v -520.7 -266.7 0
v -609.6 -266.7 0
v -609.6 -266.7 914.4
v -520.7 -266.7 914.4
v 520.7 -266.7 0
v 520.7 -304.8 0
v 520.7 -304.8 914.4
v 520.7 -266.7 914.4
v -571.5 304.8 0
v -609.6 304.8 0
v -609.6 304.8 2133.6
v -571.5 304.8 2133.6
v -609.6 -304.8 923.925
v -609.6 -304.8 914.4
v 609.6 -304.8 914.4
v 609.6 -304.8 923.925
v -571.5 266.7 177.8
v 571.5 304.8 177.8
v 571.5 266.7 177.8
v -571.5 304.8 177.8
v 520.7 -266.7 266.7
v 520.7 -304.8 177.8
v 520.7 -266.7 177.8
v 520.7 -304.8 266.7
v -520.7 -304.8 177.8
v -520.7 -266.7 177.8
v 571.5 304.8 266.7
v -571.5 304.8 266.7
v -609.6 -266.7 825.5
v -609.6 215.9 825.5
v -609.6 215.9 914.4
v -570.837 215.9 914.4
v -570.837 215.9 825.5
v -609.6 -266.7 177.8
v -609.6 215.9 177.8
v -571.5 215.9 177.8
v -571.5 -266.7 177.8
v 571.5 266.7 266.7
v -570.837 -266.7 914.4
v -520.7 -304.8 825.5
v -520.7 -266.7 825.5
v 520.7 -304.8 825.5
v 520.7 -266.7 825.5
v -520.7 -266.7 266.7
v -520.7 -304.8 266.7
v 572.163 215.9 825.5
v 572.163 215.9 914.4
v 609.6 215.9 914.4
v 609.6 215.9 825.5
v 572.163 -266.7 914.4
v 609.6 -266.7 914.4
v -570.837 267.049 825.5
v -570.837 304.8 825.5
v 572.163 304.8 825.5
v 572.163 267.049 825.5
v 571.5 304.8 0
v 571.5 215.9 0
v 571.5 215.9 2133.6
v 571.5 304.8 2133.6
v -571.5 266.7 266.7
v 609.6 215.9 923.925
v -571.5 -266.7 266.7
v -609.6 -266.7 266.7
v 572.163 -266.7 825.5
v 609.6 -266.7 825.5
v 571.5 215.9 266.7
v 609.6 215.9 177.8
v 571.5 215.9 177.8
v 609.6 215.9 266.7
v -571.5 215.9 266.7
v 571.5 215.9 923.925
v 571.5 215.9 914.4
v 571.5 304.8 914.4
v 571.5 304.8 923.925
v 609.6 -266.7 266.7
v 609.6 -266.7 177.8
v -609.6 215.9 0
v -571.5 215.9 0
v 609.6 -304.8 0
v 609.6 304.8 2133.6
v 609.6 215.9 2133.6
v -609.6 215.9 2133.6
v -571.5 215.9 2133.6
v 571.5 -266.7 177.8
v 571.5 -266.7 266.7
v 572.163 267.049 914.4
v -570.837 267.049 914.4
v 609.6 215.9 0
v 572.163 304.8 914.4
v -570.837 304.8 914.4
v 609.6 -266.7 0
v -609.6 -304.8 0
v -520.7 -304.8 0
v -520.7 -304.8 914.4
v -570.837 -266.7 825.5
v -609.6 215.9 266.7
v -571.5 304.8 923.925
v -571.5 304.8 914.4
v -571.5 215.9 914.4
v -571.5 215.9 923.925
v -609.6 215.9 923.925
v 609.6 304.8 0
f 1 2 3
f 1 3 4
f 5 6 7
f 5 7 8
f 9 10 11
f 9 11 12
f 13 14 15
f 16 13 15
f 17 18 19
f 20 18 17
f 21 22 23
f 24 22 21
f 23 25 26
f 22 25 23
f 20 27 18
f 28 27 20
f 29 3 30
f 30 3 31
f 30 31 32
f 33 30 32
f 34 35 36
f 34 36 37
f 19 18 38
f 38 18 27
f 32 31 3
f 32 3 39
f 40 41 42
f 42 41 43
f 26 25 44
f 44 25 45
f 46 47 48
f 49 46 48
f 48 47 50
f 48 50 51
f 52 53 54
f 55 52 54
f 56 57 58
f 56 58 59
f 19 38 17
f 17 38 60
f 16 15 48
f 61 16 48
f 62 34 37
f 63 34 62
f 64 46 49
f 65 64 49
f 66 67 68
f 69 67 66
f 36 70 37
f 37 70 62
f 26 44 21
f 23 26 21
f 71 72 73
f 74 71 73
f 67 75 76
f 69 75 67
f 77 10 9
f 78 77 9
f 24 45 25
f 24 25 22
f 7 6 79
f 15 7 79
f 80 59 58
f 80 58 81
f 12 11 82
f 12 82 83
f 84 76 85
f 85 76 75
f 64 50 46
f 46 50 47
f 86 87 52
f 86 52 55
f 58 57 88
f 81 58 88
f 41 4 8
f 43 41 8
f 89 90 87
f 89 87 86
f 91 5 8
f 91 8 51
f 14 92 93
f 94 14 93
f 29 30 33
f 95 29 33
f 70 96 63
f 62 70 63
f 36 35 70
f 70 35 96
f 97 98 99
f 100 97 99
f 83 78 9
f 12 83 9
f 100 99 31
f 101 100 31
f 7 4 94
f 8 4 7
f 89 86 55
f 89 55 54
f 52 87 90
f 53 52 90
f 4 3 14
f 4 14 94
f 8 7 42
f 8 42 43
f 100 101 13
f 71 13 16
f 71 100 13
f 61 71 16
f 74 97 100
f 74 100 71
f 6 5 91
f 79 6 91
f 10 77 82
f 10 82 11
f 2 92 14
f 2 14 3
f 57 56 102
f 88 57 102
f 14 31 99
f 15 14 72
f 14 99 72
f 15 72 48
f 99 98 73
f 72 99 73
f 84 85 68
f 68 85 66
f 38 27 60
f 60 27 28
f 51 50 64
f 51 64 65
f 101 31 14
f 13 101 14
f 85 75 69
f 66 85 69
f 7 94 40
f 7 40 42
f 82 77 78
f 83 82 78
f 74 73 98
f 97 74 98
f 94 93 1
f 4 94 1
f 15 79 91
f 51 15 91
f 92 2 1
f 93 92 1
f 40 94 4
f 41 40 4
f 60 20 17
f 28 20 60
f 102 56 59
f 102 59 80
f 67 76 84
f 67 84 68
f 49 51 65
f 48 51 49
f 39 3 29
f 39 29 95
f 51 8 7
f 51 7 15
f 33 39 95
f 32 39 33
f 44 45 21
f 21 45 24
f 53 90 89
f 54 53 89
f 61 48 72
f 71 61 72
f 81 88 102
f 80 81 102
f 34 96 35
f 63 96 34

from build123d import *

# Parameters (mm, degrees)
F0_W      = 38.1
F0_H      = 88.9
F1_DEPTH  = 2133.6
F0_W_2    = 88.9
F0_H_2    = 38.1
F2_DEPTH  = 914.4
F3_W      = 1041.4
F3_H      = 88.9
F4_DEPTH  = 38.1
F5_W      = 482.6
F5_H      = 88.9
F6_DEPTH  = 38.1
F7_W      = 1143
F7_H      = 88.9
F8_DEPTH  = 38.1
F9_W      = 482.6
F9_H      = 88.9
F10_DEPTH = 38.1
F11_W     = 38.76292
F11_H     = 482.6
F11_W_2   = 1143
F11_H_2   = 37.750807
F11_W_3   = 37.43708
F11_W_4   = 1041.4
F11_H_3   = 38.1
F12_DEPTH = 88.9
F14_DEPTH = 9.525


with BuildPart() as f1:
    # F0 (on Top) → F1 (new body)
    with BuildSketch(Plane.XY):
        with Locations((-590.55, 260.35)):
            Rectangle(F0_W, F0_H)
        with Locations((590.55, 260.35)):
            Rectangle(F0_W, F0_H)
    extrude(amount=F1_DEPTH)


with BuildPart() as f2:
    # F0 (on Top) → F2 (new body)
    with BuildSketch(Plane.XY):
        with Locations((-565.15, -285.75)):
            Rectangle(F0_W_2, F0_H_2)
        with Locations((565.15, -285.75)):
            Rectangle(F0_W_2, F0_H_2)
    extrude(amount=F2_DEPTH)


with BuildPart() as f4:
    # F3 (on face) → F4 (new body)
    with BuildSketch(Plane.XZ.offset(304.8)):
        with Locations((0, 222.25)):
            Rectangle(F3_W, F3_H)
    extrude(amount=-F4_DEPTH)


with BuildPart() as f6:
    # F5 (on face) → F6 (new body)
    with BuildSketch(Plane.YZ.offset(609.6)):
        with Locations((-25.4, 222.25)):
            Rectangle(F5_W, F5_H)
    extrude(amount=-F6_DEPTH)


with BuildPart() as f8:
    # F7 (on face) → F8 (new body)
    with BuildSketch(Plane(origin=(0, 304.8, 0), x_dir=(-1, 0, 0), z_dir=(0, 1, 0))):
        with Locations((0, 222.25)):
            Rectangle(F7_W, F7_H)
    extrude(amount=-F8_DEPTH)


with BuildPart() as f10:
    # F9 (on face) → F10 (new body)
    with BuildSketch(Plane(origin=(-609.6, 0, 0), x_dir=(0, -1, 0), z_dir=(-1, 0, 0))):
        with Locations((25.4, 222.25)):
            Rectangle(F9_W, F9_H)
    extrude(amount=-F10_DEPTH)


with BuildPart() as f12:
    # F11 (on face) → F12 (new body)
    with BuildSketch(Plane.XY.offset(914.4)):
        with Locations((-590.21854, -25.4)):
            Rectangle(F11_W, F11_H)
        with Locations((0.66292, 285.924597)):
            Rectangle(F11_W_2, F11_H_2)
        with Locations((590.88146, -25.4)):
            Rectangle(F11_W_3, F11_H)
        with Locations((0, -285.75)):
            Rectangle(F11_W_4, F11_H_3)
    extrude(amount=-F12_DEPTH)


with BuildPart() as f14:
    # F13 (on face) → F14 (new body)
    with BuildSketch(Plane.XY.offset(914.4)):
        Polygon((-571.5, 215.9), (-609.6, 215.9), (-609.6, -304.8), (609.6, -304.8), (609.6, 215.9), (571.5, 215.9), (571.5, 304.8), (-571.5, 304.8), align=None)
    extrude(amount=F14_DEPTH)


solid = Compound([f1.part, f2.part, f4.part, f6.part, f8.part, f10.part, f12.part, f14.part])
